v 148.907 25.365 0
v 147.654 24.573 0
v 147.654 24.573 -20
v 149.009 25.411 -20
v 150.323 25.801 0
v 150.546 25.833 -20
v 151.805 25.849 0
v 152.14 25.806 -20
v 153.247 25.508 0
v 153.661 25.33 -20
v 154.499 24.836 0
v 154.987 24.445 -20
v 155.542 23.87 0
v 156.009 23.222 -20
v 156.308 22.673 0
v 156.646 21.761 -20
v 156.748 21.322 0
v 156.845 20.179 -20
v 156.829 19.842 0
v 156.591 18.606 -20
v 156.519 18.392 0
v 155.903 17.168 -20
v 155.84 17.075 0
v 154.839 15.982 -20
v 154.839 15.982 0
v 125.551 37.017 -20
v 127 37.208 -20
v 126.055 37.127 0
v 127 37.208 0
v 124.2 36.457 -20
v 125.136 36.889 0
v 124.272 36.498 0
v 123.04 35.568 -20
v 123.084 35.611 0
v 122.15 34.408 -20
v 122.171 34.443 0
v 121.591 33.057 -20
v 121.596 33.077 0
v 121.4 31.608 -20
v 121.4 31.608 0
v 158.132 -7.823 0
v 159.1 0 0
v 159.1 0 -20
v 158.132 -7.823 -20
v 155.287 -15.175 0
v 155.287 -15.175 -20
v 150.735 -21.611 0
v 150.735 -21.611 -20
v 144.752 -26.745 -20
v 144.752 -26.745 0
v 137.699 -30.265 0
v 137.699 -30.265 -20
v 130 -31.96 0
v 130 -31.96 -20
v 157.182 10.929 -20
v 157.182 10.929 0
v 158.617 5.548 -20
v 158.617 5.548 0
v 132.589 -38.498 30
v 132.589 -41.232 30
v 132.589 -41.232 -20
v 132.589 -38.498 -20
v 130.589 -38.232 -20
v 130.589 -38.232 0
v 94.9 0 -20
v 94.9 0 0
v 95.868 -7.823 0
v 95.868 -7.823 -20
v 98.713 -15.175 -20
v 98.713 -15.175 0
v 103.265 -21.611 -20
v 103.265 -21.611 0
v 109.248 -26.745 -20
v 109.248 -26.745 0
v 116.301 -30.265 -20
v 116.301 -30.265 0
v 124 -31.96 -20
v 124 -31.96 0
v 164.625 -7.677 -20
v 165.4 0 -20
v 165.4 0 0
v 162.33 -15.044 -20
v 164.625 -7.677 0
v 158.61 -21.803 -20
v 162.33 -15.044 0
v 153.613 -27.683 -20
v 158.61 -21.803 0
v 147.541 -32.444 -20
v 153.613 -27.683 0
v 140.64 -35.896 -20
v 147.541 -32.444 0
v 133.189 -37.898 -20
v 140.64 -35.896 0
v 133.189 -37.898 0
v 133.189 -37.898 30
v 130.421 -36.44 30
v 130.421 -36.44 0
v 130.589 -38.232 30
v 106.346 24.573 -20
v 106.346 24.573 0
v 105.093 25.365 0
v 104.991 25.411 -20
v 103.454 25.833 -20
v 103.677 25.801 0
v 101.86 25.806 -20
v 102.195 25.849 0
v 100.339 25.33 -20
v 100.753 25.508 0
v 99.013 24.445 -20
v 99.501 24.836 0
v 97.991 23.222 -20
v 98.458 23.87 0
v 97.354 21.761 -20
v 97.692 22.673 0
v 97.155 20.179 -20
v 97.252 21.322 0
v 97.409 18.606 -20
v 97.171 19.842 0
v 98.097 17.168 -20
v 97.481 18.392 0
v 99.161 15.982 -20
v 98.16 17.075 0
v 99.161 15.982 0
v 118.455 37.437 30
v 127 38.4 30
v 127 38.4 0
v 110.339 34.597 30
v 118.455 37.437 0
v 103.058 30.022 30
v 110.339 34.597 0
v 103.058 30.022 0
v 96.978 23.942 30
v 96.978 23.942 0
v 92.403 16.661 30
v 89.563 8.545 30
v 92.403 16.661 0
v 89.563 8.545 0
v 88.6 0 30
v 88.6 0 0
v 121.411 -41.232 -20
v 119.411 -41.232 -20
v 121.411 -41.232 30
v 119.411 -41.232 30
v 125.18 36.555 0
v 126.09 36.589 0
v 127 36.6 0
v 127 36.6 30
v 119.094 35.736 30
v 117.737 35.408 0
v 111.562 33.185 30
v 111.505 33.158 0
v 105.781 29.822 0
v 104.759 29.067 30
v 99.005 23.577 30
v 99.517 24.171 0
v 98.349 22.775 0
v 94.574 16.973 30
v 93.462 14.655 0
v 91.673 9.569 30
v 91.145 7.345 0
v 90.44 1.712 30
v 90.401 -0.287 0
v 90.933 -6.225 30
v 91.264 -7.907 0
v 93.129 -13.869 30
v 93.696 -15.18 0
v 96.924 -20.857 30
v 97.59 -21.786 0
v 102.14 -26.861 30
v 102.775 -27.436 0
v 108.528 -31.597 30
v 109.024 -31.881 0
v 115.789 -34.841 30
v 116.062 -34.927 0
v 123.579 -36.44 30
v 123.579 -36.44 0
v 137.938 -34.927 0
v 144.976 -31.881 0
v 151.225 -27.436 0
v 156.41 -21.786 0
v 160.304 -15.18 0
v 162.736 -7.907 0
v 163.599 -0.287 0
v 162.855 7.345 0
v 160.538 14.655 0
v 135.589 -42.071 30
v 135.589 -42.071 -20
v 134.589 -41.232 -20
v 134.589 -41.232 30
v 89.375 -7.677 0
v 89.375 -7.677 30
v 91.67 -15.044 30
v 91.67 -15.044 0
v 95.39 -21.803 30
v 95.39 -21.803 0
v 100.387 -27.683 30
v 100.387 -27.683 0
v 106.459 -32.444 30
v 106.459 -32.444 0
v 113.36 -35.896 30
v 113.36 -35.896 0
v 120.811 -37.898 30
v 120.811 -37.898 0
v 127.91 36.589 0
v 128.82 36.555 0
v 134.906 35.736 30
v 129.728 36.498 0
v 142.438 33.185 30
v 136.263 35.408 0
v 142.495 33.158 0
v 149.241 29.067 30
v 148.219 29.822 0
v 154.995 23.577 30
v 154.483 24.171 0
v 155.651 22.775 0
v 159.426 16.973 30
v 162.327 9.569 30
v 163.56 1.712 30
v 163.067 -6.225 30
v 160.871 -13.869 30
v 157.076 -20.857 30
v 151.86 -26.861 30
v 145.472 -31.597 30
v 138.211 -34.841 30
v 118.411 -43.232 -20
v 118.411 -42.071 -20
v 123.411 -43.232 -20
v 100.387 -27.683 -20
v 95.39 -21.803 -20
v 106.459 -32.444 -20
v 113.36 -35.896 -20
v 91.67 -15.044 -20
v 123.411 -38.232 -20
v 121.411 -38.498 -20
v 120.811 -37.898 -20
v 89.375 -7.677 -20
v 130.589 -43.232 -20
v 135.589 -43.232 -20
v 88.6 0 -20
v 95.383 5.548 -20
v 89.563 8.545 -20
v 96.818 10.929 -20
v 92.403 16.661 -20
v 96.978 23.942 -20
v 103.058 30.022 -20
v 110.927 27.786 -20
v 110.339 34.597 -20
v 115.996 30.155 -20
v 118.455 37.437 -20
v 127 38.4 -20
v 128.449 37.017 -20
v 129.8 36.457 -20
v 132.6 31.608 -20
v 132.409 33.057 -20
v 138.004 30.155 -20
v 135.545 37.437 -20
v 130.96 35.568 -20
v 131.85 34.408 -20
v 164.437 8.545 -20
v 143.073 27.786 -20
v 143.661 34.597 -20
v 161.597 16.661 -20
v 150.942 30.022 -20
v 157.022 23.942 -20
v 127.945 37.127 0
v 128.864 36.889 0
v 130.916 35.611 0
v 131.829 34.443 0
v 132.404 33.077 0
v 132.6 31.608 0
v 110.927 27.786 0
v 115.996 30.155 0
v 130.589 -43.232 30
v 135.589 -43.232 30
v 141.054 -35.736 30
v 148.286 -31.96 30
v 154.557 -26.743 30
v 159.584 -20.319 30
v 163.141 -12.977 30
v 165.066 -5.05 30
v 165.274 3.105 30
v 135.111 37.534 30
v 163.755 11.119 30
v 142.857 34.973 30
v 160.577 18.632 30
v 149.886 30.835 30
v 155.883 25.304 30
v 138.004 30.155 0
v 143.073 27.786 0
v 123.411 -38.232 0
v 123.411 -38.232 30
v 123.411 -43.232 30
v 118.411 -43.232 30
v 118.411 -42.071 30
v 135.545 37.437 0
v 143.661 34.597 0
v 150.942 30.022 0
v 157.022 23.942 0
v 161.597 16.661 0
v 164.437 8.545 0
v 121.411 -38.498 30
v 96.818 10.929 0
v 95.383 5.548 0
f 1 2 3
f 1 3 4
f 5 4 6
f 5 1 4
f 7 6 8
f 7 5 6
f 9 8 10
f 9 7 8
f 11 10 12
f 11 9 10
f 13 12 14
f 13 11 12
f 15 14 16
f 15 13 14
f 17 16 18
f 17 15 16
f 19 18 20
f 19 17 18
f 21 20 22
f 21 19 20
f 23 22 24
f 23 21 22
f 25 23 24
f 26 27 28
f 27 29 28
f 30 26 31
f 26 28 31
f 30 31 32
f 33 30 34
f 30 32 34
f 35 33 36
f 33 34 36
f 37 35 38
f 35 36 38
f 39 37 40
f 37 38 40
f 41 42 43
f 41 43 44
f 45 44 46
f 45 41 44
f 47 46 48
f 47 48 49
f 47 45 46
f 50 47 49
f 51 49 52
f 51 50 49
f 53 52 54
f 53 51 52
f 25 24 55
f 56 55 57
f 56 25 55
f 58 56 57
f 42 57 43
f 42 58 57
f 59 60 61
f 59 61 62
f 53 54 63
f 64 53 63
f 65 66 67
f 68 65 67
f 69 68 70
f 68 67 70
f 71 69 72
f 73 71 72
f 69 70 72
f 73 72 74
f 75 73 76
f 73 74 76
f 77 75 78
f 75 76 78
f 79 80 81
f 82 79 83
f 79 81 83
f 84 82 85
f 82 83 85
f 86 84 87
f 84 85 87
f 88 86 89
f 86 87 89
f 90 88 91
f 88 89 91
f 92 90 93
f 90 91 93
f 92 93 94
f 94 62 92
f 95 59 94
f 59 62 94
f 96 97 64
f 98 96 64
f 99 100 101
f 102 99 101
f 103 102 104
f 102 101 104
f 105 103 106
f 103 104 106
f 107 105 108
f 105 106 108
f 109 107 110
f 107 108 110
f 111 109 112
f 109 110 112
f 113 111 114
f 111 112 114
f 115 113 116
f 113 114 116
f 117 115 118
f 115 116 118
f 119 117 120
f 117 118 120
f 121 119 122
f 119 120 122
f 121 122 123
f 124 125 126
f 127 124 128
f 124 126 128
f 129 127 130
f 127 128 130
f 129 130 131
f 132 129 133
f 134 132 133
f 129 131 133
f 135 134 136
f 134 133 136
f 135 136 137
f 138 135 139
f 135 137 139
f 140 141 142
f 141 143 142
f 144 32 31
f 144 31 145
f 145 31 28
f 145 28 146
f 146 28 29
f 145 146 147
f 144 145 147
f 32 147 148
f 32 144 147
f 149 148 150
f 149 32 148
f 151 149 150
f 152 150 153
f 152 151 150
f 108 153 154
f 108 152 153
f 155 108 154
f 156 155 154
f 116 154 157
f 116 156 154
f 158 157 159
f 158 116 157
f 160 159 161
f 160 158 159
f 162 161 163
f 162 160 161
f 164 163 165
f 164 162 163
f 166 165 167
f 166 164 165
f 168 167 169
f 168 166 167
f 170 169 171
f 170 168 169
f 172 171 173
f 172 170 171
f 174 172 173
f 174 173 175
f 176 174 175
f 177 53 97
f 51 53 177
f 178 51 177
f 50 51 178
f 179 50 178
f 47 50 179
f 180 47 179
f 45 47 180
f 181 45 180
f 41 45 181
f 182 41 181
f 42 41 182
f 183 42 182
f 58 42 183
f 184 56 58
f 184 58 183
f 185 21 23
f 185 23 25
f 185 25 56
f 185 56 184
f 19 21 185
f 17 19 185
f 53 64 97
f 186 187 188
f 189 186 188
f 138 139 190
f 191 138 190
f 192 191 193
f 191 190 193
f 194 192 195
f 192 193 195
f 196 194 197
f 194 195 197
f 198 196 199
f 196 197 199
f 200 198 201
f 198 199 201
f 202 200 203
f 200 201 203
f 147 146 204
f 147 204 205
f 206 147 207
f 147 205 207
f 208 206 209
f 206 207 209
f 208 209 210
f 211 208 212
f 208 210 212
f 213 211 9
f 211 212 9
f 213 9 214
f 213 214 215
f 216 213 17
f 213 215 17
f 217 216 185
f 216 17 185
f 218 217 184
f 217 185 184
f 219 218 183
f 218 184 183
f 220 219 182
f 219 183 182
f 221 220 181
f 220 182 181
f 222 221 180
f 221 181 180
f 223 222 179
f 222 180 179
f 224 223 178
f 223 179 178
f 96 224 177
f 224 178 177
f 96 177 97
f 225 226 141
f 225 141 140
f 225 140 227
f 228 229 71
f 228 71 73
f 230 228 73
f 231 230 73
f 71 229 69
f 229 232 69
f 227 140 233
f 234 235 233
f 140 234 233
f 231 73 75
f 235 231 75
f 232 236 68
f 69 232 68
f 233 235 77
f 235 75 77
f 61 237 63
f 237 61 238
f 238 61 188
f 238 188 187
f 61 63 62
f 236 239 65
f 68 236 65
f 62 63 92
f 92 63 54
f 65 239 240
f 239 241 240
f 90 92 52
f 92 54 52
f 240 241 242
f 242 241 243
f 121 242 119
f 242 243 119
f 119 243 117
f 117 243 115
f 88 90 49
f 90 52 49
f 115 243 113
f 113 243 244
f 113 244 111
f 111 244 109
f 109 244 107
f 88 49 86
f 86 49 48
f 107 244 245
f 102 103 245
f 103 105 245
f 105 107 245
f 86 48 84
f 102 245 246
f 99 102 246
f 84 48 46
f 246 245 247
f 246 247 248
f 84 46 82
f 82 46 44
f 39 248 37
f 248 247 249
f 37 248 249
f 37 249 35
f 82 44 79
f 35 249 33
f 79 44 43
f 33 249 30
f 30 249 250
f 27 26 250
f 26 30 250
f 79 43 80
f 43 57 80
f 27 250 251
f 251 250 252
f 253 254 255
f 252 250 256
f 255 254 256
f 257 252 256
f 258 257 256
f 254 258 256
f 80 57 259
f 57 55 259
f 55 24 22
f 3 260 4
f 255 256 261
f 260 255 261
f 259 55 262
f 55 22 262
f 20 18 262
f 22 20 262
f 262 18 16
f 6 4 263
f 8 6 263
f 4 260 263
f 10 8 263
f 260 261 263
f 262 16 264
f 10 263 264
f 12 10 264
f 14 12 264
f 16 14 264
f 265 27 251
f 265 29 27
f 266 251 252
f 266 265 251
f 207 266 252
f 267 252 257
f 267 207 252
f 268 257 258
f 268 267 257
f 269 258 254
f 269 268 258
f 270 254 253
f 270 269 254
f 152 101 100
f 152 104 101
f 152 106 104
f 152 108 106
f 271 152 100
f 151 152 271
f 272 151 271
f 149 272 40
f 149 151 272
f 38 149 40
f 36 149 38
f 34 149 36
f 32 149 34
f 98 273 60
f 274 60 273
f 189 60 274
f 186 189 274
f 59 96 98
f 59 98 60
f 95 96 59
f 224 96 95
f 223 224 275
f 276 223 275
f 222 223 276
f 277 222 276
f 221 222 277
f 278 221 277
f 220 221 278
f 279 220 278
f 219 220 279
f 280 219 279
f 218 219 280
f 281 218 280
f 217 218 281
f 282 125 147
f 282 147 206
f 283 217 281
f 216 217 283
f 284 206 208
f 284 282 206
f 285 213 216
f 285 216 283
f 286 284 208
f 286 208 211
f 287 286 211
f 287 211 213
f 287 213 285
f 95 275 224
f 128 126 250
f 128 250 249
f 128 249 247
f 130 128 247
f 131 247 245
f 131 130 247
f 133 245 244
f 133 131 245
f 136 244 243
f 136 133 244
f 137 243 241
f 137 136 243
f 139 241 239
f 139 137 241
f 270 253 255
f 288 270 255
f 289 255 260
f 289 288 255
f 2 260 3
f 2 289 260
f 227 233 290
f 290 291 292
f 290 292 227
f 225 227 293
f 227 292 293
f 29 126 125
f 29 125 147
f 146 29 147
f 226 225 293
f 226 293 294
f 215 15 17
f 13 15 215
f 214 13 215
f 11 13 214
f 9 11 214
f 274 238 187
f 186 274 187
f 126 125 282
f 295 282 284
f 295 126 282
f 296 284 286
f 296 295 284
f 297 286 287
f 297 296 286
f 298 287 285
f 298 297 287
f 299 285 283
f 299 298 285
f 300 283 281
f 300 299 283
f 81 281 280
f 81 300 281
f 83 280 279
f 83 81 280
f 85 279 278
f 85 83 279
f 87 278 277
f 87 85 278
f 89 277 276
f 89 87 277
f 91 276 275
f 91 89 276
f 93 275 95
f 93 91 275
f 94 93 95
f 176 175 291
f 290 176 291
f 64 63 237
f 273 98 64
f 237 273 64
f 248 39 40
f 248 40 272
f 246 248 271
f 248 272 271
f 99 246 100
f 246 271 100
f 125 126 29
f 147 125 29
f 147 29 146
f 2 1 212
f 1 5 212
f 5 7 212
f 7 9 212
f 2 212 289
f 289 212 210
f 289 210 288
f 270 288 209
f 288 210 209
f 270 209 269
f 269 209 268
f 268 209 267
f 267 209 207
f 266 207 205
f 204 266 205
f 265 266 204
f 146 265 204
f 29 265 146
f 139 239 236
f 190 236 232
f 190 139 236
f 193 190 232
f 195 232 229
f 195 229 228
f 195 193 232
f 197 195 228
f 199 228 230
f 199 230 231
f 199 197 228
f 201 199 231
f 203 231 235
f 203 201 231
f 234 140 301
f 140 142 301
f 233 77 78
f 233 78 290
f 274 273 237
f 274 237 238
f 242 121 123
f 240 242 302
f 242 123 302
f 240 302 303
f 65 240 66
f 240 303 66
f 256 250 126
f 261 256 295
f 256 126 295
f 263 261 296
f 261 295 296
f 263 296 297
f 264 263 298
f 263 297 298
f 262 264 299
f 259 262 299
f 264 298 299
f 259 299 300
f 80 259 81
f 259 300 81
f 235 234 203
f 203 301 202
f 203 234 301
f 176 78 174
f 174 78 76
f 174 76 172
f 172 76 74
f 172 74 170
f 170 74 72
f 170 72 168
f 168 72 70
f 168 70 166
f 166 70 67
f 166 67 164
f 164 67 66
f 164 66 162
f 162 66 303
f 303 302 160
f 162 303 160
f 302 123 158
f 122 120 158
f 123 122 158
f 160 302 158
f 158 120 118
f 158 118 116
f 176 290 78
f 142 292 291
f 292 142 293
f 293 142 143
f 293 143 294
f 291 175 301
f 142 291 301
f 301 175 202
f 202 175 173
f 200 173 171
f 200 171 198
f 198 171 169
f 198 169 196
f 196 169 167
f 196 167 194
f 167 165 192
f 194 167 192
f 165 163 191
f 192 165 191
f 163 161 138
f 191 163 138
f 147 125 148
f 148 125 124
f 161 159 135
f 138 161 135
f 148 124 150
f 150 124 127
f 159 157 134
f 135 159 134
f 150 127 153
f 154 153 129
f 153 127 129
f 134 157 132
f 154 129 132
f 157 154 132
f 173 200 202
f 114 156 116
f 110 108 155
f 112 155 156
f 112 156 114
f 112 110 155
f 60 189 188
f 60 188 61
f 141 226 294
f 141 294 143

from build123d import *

# Parameters (mm, degrees)
PAD015_DEPTH = 20
PAD016_DEPTH = 30
PAD017_DEPTH = 20
PAD018_DEPTH = 30
PAD019_DEPTH = 30
PAD020_DEPTH = 20


with BuildPart() as part:
    # Sketch024 → Pad015 (new body)
    with BuildSketch(Plane.XY):
        with BuildLine():
            ThreePointArc((0, 38.4), (-27.1529, 27.1529), (-38.4, 0))
            Line((-38.4, 0), (-32.1, 0))
            ThreePointArc((-27.838774, 15.981636), (-31.016404, 8.269987), (-32.1, 0))
            ThreePointArc((-20.653618, 24.573116), (-28.541936, 23.869954), (-27.838774, 15.981636))
            ThreePointArc((-5.6, 31.607752), (-13.589873, 29.081358), (-20.653618, 24.573116))
            ThreePointArc((0, 37.207752), (-3.959798, 35.56755), (-5.6, 31.607752))
            Line((0, 38.4), (0, 37.207752))
        make_face()
    pad015 = extrude(amount=-PAD015_DEPTH)

    # Sketch025 → Pad016 (join)
    with BuildSketch(Plane.XY):
        with BuildLine():
            ThreePointArc((-1.8e-05, 36.6), (-25.880117, 25.880104), (-36.6, 0))
            Line((-36.6, 0), (-38.4, 0))
            ThreePointArc((0, 38.4), (-27.152903, 27.152903), (-38.4, 0))
            Line((0, 38.4), (-1.8e-05, 36.6))
        make_face()
    pad016 = extrude(amount=PAD016_DEPTH)

    # Sketch026 → Pad017 (join)
    with BuildSketch(Plane.XY):
        with BuildLine():
            ThreePointArc((-32.1, 0), (-23.735101, -21.611455), (-3, -31.959506))
            Line((-3, -31.959506), (-3.588785, -38.231932))
            ThreePointArc((-38.4, 0), (-28.393391, -25.852956), (-3.588785, -38.231932))
            Line((-38.4, 0), (-32.1, 0))
        make_face()
    pad017 = extrude(amount=-PAD017_DEPTH)

    # Sketch027 → Pad018 (join)
    with BuildSketch(Plane.XY):
        with BuildLine():
            ThreePointArc((0, 38.4), (-38.35796, 1.796359), (-3.588785, -38.231932))
            Line((-3.420561, -36.43981), (-3.588785, -38.231932))
            ThreePointArc((-1.8e-05, 36.6), (-36.559931, 1.712146), (-3.420561, -36.43981))
            Line((0, 38.4), (-1.8e-05, 36.6))
        make_face()
    pad018 = extrude(amount=PAD018_DEPTH)

    # Mirrored003: Pad018, Pad017, Pad016, Pad015 across Sketch027 V_Axis
    add(pad018.mirror(Plane(origin=(0, 0, 0), x_dir=(0, 0, 1), z_dir=(1, 0, 0))))
    add(pad017.mirror(Plane(origin=(0, 0, 0), x_dir=(0, 0, 1), z_dir=(1, 0, 0))))
    add(pad016.mirror(Plane(origin=(0, 0, 0), x_dir=(0, 0, 1), z_dir=(1, 0, 0))))
    add(pad015.mirror(Plane(origin=(0, 0, 0), x_dir=(0, 0, 1), z_dir=(1, 0, 0))))

    # Sketch028 → Pad019 (join)
    with BuildSketch(Plane.XY):
        with BuildLine():
            ThreePointArc((-6.188785, -37.898007), (-4.891635, -38.087162), (-3.588785, -38.231932))
            Line((-3.588785, -38.231932), (-3.588785, -43.231932))
            Line((-3.588785, -43.231932), (-8.588785, -43.231932))
            Line((-8.588785, -43.231932), (-8.588785, -42.071032))
            Line((-8.588785, -42.071032), (-7.588785, -41.231932))
            Line((-7.588785, -41.231932), (-5.588785, -41.231932))
            Line((-5.588785, -41.231932), (-5.588785, -38.498007))
            Line((-5.588785, -38.498007), (-6.188785, -37.898007))
        make_face()
    pad019 = extrude(amount=PAD019_DEPTH)

    # Sketch028 → Pad020 (join)
    with BuildSketch(Plane.XY):
        with BuildLine():
            ThreePointArc((-6.188785, -37.898007), (-4.891635, -38.087162), (-3.588785, -38.231932))
            Line((-3.588785, -38.231932), (-3.588785, -43.231932))
            Line((-3.588785, -43.231932), (-8.588785, -43.231932))
            Line((-8.588785, -43.231932), (-8.588785, -42.071032))
            Line((-8.588785, -42.071032), (-7.588785, -41.231932))
            Line((-7.588785, -41.231932), (-5.588785, -41.231932))
            Line((-5.588785, -41.231932), (-5.588785, -38.498007))
            Line((-5.588785, -38.498007), (-6.188785, -37.898007))
        make_face()
    pad020 = extrude(amount=-PAD020_DEPTH)

    # Mirrored004: Pad019, Pad020 across Sketch028 V_Axis
    add(pad019.mirror(Plane(origin=(0, 0, 0), x_dir=(0, 0, 1), z_dir=(1, 0, 0))))
    add(pad020.mirror(Plane(origin=(0, 0, 0), x_dir=(0, 0, 1), z_dir=(1, 0, 0))))


with BuildPart() as part_1:
    # Body020 placement: moved
    add(part.part.moved(Location((127, 0, 0))))


solid = part_1.part
